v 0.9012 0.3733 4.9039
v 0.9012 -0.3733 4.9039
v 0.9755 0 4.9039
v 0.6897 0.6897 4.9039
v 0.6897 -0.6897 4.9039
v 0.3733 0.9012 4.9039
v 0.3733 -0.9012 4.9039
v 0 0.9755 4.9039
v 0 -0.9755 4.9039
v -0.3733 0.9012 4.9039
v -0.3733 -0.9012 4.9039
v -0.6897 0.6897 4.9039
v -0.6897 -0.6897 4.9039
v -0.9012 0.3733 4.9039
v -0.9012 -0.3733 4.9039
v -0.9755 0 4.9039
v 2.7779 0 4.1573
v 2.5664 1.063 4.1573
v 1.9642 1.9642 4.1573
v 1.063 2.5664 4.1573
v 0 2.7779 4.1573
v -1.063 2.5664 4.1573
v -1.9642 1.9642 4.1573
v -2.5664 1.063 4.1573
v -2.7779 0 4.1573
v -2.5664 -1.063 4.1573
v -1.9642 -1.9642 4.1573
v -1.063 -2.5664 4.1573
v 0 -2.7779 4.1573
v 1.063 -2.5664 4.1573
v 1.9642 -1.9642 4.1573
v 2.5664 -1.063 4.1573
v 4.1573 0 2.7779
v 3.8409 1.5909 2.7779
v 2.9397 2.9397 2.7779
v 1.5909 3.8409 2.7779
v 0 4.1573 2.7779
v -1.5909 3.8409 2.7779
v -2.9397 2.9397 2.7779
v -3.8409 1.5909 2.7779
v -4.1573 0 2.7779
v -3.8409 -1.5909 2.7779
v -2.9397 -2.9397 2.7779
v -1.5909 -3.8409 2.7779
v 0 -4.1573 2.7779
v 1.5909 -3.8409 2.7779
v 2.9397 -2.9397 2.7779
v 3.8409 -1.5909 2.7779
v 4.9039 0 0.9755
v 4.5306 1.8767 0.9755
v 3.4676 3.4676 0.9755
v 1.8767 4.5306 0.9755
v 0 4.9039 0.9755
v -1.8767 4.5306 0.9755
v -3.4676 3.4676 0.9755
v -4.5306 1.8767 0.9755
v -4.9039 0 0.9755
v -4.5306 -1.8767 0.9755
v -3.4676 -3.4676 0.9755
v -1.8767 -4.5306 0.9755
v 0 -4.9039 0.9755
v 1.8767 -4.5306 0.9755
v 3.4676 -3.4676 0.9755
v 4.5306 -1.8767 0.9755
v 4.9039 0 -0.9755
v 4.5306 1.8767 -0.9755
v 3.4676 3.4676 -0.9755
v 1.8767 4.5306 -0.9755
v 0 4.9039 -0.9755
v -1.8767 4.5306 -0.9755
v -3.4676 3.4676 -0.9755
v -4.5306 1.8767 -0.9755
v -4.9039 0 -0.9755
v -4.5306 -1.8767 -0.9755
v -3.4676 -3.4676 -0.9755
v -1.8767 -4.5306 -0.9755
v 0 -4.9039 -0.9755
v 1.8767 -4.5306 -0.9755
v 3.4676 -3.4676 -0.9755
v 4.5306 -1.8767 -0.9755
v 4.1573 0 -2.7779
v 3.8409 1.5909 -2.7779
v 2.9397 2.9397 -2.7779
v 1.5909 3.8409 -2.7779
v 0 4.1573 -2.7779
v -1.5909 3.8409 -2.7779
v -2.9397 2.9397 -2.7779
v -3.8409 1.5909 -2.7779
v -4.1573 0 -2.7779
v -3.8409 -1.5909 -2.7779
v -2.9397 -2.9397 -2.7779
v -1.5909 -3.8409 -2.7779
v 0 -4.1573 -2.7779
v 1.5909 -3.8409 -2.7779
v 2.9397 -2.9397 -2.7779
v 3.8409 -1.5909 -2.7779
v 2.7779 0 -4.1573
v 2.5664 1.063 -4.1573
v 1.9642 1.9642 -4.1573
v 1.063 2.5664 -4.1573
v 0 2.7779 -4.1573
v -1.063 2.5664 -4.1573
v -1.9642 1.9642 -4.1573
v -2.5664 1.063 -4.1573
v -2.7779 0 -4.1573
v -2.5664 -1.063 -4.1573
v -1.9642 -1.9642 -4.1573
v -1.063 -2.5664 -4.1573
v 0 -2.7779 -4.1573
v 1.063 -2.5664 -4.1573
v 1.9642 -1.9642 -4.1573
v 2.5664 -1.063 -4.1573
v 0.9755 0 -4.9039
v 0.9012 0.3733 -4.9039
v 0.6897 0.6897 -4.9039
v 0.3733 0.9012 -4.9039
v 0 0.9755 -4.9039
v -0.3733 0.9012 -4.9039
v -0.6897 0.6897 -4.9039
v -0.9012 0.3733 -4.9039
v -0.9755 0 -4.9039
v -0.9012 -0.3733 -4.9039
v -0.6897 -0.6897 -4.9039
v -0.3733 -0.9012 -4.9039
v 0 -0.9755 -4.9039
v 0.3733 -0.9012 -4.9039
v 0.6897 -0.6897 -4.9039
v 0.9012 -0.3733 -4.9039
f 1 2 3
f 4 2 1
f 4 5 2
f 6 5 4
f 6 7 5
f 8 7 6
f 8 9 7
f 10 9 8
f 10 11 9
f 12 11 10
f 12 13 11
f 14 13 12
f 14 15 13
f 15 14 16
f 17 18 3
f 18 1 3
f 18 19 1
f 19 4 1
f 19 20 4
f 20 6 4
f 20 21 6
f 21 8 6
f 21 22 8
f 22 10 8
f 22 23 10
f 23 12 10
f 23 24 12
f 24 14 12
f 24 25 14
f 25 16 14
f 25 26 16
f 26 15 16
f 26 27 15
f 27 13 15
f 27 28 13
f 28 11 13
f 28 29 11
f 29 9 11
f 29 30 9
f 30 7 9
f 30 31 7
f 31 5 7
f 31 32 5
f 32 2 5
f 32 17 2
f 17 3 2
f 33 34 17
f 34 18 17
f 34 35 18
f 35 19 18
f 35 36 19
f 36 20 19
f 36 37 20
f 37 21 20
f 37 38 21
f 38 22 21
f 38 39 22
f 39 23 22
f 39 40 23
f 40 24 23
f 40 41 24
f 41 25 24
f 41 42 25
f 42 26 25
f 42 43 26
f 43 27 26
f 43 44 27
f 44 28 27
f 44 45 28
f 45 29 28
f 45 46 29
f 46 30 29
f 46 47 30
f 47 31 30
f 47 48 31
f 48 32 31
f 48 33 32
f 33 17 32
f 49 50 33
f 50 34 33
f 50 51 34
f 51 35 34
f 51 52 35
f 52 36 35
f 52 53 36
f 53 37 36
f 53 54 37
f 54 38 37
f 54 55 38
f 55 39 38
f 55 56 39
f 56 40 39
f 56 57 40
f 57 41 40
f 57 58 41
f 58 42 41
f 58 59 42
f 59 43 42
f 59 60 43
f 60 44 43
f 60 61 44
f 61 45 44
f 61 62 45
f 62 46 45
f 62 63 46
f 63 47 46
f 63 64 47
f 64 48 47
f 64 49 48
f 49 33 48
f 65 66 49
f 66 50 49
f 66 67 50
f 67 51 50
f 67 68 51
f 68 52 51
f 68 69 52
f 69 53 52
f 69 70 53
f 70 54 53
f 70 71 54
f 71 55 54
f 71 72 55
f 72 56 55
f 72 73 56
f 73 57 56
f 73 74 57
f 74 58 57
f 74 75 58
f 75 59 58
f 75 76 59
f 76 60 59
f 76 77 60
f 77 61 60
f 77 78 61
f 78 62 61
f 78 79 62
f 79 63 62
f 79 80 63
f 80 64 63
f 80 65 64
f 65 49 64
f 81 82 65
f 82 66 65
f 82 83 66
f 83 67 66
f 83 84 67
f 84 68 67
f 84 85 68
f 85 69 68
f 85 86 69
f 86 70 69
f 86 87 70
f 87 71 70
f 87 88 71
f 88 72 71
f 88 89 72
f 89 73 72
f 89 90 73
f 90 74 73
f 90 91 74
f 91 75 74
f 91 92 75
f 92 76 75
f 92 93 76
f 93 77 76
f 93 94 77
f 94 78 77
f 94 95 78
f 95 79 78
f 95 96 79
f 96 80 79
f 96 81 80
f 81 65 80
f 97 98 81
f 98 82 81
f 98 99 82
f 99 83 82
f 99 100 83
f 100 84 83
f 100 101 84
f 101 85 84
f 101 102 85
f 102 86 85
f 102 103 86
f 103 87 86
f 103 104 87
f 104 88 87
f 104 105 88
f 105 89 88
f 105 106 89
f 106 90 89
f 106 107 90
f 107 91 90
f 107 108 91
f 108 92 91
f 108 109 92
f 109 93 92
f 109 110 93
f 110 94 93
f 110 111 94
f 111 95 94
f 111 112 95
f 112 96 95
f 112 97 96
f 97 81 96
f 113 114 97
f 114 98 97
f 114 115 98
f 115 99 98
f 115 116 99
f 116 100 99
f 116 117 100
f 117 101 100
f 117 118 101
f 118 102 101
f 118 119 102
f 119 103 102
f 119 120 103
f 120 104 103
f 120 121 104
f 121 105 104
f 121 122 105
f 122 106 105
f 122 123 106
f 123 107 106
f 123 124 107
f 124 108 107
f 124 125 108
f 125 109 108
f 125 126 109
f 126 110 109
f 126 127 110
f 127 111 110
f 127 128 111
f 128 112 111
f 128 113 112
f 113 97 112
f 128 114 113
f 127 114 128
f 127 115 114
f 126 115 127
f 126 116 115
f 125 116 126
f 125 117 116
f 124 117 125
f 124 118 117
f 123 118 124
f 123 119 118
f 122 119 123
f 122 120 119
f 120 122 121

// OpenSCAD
// file: used_module_in_block.scad
// A module file that wraps its demo call and module definition in a bare
// { } block, matching a real-world pattern used to hide helper variables
// from the Customizer while a standalone demo call still renders when this
// file is opened directly (not `use`'d).
someVar = 42;

{
  helperSize = someVar * 2;

  usedHelper(helperSize);

  module usedHelper(size) {
    sphere(r=size);
  }
}
// main file
use <used_module_in_block.scad>

Size = 5;

usedHelper(Size);
